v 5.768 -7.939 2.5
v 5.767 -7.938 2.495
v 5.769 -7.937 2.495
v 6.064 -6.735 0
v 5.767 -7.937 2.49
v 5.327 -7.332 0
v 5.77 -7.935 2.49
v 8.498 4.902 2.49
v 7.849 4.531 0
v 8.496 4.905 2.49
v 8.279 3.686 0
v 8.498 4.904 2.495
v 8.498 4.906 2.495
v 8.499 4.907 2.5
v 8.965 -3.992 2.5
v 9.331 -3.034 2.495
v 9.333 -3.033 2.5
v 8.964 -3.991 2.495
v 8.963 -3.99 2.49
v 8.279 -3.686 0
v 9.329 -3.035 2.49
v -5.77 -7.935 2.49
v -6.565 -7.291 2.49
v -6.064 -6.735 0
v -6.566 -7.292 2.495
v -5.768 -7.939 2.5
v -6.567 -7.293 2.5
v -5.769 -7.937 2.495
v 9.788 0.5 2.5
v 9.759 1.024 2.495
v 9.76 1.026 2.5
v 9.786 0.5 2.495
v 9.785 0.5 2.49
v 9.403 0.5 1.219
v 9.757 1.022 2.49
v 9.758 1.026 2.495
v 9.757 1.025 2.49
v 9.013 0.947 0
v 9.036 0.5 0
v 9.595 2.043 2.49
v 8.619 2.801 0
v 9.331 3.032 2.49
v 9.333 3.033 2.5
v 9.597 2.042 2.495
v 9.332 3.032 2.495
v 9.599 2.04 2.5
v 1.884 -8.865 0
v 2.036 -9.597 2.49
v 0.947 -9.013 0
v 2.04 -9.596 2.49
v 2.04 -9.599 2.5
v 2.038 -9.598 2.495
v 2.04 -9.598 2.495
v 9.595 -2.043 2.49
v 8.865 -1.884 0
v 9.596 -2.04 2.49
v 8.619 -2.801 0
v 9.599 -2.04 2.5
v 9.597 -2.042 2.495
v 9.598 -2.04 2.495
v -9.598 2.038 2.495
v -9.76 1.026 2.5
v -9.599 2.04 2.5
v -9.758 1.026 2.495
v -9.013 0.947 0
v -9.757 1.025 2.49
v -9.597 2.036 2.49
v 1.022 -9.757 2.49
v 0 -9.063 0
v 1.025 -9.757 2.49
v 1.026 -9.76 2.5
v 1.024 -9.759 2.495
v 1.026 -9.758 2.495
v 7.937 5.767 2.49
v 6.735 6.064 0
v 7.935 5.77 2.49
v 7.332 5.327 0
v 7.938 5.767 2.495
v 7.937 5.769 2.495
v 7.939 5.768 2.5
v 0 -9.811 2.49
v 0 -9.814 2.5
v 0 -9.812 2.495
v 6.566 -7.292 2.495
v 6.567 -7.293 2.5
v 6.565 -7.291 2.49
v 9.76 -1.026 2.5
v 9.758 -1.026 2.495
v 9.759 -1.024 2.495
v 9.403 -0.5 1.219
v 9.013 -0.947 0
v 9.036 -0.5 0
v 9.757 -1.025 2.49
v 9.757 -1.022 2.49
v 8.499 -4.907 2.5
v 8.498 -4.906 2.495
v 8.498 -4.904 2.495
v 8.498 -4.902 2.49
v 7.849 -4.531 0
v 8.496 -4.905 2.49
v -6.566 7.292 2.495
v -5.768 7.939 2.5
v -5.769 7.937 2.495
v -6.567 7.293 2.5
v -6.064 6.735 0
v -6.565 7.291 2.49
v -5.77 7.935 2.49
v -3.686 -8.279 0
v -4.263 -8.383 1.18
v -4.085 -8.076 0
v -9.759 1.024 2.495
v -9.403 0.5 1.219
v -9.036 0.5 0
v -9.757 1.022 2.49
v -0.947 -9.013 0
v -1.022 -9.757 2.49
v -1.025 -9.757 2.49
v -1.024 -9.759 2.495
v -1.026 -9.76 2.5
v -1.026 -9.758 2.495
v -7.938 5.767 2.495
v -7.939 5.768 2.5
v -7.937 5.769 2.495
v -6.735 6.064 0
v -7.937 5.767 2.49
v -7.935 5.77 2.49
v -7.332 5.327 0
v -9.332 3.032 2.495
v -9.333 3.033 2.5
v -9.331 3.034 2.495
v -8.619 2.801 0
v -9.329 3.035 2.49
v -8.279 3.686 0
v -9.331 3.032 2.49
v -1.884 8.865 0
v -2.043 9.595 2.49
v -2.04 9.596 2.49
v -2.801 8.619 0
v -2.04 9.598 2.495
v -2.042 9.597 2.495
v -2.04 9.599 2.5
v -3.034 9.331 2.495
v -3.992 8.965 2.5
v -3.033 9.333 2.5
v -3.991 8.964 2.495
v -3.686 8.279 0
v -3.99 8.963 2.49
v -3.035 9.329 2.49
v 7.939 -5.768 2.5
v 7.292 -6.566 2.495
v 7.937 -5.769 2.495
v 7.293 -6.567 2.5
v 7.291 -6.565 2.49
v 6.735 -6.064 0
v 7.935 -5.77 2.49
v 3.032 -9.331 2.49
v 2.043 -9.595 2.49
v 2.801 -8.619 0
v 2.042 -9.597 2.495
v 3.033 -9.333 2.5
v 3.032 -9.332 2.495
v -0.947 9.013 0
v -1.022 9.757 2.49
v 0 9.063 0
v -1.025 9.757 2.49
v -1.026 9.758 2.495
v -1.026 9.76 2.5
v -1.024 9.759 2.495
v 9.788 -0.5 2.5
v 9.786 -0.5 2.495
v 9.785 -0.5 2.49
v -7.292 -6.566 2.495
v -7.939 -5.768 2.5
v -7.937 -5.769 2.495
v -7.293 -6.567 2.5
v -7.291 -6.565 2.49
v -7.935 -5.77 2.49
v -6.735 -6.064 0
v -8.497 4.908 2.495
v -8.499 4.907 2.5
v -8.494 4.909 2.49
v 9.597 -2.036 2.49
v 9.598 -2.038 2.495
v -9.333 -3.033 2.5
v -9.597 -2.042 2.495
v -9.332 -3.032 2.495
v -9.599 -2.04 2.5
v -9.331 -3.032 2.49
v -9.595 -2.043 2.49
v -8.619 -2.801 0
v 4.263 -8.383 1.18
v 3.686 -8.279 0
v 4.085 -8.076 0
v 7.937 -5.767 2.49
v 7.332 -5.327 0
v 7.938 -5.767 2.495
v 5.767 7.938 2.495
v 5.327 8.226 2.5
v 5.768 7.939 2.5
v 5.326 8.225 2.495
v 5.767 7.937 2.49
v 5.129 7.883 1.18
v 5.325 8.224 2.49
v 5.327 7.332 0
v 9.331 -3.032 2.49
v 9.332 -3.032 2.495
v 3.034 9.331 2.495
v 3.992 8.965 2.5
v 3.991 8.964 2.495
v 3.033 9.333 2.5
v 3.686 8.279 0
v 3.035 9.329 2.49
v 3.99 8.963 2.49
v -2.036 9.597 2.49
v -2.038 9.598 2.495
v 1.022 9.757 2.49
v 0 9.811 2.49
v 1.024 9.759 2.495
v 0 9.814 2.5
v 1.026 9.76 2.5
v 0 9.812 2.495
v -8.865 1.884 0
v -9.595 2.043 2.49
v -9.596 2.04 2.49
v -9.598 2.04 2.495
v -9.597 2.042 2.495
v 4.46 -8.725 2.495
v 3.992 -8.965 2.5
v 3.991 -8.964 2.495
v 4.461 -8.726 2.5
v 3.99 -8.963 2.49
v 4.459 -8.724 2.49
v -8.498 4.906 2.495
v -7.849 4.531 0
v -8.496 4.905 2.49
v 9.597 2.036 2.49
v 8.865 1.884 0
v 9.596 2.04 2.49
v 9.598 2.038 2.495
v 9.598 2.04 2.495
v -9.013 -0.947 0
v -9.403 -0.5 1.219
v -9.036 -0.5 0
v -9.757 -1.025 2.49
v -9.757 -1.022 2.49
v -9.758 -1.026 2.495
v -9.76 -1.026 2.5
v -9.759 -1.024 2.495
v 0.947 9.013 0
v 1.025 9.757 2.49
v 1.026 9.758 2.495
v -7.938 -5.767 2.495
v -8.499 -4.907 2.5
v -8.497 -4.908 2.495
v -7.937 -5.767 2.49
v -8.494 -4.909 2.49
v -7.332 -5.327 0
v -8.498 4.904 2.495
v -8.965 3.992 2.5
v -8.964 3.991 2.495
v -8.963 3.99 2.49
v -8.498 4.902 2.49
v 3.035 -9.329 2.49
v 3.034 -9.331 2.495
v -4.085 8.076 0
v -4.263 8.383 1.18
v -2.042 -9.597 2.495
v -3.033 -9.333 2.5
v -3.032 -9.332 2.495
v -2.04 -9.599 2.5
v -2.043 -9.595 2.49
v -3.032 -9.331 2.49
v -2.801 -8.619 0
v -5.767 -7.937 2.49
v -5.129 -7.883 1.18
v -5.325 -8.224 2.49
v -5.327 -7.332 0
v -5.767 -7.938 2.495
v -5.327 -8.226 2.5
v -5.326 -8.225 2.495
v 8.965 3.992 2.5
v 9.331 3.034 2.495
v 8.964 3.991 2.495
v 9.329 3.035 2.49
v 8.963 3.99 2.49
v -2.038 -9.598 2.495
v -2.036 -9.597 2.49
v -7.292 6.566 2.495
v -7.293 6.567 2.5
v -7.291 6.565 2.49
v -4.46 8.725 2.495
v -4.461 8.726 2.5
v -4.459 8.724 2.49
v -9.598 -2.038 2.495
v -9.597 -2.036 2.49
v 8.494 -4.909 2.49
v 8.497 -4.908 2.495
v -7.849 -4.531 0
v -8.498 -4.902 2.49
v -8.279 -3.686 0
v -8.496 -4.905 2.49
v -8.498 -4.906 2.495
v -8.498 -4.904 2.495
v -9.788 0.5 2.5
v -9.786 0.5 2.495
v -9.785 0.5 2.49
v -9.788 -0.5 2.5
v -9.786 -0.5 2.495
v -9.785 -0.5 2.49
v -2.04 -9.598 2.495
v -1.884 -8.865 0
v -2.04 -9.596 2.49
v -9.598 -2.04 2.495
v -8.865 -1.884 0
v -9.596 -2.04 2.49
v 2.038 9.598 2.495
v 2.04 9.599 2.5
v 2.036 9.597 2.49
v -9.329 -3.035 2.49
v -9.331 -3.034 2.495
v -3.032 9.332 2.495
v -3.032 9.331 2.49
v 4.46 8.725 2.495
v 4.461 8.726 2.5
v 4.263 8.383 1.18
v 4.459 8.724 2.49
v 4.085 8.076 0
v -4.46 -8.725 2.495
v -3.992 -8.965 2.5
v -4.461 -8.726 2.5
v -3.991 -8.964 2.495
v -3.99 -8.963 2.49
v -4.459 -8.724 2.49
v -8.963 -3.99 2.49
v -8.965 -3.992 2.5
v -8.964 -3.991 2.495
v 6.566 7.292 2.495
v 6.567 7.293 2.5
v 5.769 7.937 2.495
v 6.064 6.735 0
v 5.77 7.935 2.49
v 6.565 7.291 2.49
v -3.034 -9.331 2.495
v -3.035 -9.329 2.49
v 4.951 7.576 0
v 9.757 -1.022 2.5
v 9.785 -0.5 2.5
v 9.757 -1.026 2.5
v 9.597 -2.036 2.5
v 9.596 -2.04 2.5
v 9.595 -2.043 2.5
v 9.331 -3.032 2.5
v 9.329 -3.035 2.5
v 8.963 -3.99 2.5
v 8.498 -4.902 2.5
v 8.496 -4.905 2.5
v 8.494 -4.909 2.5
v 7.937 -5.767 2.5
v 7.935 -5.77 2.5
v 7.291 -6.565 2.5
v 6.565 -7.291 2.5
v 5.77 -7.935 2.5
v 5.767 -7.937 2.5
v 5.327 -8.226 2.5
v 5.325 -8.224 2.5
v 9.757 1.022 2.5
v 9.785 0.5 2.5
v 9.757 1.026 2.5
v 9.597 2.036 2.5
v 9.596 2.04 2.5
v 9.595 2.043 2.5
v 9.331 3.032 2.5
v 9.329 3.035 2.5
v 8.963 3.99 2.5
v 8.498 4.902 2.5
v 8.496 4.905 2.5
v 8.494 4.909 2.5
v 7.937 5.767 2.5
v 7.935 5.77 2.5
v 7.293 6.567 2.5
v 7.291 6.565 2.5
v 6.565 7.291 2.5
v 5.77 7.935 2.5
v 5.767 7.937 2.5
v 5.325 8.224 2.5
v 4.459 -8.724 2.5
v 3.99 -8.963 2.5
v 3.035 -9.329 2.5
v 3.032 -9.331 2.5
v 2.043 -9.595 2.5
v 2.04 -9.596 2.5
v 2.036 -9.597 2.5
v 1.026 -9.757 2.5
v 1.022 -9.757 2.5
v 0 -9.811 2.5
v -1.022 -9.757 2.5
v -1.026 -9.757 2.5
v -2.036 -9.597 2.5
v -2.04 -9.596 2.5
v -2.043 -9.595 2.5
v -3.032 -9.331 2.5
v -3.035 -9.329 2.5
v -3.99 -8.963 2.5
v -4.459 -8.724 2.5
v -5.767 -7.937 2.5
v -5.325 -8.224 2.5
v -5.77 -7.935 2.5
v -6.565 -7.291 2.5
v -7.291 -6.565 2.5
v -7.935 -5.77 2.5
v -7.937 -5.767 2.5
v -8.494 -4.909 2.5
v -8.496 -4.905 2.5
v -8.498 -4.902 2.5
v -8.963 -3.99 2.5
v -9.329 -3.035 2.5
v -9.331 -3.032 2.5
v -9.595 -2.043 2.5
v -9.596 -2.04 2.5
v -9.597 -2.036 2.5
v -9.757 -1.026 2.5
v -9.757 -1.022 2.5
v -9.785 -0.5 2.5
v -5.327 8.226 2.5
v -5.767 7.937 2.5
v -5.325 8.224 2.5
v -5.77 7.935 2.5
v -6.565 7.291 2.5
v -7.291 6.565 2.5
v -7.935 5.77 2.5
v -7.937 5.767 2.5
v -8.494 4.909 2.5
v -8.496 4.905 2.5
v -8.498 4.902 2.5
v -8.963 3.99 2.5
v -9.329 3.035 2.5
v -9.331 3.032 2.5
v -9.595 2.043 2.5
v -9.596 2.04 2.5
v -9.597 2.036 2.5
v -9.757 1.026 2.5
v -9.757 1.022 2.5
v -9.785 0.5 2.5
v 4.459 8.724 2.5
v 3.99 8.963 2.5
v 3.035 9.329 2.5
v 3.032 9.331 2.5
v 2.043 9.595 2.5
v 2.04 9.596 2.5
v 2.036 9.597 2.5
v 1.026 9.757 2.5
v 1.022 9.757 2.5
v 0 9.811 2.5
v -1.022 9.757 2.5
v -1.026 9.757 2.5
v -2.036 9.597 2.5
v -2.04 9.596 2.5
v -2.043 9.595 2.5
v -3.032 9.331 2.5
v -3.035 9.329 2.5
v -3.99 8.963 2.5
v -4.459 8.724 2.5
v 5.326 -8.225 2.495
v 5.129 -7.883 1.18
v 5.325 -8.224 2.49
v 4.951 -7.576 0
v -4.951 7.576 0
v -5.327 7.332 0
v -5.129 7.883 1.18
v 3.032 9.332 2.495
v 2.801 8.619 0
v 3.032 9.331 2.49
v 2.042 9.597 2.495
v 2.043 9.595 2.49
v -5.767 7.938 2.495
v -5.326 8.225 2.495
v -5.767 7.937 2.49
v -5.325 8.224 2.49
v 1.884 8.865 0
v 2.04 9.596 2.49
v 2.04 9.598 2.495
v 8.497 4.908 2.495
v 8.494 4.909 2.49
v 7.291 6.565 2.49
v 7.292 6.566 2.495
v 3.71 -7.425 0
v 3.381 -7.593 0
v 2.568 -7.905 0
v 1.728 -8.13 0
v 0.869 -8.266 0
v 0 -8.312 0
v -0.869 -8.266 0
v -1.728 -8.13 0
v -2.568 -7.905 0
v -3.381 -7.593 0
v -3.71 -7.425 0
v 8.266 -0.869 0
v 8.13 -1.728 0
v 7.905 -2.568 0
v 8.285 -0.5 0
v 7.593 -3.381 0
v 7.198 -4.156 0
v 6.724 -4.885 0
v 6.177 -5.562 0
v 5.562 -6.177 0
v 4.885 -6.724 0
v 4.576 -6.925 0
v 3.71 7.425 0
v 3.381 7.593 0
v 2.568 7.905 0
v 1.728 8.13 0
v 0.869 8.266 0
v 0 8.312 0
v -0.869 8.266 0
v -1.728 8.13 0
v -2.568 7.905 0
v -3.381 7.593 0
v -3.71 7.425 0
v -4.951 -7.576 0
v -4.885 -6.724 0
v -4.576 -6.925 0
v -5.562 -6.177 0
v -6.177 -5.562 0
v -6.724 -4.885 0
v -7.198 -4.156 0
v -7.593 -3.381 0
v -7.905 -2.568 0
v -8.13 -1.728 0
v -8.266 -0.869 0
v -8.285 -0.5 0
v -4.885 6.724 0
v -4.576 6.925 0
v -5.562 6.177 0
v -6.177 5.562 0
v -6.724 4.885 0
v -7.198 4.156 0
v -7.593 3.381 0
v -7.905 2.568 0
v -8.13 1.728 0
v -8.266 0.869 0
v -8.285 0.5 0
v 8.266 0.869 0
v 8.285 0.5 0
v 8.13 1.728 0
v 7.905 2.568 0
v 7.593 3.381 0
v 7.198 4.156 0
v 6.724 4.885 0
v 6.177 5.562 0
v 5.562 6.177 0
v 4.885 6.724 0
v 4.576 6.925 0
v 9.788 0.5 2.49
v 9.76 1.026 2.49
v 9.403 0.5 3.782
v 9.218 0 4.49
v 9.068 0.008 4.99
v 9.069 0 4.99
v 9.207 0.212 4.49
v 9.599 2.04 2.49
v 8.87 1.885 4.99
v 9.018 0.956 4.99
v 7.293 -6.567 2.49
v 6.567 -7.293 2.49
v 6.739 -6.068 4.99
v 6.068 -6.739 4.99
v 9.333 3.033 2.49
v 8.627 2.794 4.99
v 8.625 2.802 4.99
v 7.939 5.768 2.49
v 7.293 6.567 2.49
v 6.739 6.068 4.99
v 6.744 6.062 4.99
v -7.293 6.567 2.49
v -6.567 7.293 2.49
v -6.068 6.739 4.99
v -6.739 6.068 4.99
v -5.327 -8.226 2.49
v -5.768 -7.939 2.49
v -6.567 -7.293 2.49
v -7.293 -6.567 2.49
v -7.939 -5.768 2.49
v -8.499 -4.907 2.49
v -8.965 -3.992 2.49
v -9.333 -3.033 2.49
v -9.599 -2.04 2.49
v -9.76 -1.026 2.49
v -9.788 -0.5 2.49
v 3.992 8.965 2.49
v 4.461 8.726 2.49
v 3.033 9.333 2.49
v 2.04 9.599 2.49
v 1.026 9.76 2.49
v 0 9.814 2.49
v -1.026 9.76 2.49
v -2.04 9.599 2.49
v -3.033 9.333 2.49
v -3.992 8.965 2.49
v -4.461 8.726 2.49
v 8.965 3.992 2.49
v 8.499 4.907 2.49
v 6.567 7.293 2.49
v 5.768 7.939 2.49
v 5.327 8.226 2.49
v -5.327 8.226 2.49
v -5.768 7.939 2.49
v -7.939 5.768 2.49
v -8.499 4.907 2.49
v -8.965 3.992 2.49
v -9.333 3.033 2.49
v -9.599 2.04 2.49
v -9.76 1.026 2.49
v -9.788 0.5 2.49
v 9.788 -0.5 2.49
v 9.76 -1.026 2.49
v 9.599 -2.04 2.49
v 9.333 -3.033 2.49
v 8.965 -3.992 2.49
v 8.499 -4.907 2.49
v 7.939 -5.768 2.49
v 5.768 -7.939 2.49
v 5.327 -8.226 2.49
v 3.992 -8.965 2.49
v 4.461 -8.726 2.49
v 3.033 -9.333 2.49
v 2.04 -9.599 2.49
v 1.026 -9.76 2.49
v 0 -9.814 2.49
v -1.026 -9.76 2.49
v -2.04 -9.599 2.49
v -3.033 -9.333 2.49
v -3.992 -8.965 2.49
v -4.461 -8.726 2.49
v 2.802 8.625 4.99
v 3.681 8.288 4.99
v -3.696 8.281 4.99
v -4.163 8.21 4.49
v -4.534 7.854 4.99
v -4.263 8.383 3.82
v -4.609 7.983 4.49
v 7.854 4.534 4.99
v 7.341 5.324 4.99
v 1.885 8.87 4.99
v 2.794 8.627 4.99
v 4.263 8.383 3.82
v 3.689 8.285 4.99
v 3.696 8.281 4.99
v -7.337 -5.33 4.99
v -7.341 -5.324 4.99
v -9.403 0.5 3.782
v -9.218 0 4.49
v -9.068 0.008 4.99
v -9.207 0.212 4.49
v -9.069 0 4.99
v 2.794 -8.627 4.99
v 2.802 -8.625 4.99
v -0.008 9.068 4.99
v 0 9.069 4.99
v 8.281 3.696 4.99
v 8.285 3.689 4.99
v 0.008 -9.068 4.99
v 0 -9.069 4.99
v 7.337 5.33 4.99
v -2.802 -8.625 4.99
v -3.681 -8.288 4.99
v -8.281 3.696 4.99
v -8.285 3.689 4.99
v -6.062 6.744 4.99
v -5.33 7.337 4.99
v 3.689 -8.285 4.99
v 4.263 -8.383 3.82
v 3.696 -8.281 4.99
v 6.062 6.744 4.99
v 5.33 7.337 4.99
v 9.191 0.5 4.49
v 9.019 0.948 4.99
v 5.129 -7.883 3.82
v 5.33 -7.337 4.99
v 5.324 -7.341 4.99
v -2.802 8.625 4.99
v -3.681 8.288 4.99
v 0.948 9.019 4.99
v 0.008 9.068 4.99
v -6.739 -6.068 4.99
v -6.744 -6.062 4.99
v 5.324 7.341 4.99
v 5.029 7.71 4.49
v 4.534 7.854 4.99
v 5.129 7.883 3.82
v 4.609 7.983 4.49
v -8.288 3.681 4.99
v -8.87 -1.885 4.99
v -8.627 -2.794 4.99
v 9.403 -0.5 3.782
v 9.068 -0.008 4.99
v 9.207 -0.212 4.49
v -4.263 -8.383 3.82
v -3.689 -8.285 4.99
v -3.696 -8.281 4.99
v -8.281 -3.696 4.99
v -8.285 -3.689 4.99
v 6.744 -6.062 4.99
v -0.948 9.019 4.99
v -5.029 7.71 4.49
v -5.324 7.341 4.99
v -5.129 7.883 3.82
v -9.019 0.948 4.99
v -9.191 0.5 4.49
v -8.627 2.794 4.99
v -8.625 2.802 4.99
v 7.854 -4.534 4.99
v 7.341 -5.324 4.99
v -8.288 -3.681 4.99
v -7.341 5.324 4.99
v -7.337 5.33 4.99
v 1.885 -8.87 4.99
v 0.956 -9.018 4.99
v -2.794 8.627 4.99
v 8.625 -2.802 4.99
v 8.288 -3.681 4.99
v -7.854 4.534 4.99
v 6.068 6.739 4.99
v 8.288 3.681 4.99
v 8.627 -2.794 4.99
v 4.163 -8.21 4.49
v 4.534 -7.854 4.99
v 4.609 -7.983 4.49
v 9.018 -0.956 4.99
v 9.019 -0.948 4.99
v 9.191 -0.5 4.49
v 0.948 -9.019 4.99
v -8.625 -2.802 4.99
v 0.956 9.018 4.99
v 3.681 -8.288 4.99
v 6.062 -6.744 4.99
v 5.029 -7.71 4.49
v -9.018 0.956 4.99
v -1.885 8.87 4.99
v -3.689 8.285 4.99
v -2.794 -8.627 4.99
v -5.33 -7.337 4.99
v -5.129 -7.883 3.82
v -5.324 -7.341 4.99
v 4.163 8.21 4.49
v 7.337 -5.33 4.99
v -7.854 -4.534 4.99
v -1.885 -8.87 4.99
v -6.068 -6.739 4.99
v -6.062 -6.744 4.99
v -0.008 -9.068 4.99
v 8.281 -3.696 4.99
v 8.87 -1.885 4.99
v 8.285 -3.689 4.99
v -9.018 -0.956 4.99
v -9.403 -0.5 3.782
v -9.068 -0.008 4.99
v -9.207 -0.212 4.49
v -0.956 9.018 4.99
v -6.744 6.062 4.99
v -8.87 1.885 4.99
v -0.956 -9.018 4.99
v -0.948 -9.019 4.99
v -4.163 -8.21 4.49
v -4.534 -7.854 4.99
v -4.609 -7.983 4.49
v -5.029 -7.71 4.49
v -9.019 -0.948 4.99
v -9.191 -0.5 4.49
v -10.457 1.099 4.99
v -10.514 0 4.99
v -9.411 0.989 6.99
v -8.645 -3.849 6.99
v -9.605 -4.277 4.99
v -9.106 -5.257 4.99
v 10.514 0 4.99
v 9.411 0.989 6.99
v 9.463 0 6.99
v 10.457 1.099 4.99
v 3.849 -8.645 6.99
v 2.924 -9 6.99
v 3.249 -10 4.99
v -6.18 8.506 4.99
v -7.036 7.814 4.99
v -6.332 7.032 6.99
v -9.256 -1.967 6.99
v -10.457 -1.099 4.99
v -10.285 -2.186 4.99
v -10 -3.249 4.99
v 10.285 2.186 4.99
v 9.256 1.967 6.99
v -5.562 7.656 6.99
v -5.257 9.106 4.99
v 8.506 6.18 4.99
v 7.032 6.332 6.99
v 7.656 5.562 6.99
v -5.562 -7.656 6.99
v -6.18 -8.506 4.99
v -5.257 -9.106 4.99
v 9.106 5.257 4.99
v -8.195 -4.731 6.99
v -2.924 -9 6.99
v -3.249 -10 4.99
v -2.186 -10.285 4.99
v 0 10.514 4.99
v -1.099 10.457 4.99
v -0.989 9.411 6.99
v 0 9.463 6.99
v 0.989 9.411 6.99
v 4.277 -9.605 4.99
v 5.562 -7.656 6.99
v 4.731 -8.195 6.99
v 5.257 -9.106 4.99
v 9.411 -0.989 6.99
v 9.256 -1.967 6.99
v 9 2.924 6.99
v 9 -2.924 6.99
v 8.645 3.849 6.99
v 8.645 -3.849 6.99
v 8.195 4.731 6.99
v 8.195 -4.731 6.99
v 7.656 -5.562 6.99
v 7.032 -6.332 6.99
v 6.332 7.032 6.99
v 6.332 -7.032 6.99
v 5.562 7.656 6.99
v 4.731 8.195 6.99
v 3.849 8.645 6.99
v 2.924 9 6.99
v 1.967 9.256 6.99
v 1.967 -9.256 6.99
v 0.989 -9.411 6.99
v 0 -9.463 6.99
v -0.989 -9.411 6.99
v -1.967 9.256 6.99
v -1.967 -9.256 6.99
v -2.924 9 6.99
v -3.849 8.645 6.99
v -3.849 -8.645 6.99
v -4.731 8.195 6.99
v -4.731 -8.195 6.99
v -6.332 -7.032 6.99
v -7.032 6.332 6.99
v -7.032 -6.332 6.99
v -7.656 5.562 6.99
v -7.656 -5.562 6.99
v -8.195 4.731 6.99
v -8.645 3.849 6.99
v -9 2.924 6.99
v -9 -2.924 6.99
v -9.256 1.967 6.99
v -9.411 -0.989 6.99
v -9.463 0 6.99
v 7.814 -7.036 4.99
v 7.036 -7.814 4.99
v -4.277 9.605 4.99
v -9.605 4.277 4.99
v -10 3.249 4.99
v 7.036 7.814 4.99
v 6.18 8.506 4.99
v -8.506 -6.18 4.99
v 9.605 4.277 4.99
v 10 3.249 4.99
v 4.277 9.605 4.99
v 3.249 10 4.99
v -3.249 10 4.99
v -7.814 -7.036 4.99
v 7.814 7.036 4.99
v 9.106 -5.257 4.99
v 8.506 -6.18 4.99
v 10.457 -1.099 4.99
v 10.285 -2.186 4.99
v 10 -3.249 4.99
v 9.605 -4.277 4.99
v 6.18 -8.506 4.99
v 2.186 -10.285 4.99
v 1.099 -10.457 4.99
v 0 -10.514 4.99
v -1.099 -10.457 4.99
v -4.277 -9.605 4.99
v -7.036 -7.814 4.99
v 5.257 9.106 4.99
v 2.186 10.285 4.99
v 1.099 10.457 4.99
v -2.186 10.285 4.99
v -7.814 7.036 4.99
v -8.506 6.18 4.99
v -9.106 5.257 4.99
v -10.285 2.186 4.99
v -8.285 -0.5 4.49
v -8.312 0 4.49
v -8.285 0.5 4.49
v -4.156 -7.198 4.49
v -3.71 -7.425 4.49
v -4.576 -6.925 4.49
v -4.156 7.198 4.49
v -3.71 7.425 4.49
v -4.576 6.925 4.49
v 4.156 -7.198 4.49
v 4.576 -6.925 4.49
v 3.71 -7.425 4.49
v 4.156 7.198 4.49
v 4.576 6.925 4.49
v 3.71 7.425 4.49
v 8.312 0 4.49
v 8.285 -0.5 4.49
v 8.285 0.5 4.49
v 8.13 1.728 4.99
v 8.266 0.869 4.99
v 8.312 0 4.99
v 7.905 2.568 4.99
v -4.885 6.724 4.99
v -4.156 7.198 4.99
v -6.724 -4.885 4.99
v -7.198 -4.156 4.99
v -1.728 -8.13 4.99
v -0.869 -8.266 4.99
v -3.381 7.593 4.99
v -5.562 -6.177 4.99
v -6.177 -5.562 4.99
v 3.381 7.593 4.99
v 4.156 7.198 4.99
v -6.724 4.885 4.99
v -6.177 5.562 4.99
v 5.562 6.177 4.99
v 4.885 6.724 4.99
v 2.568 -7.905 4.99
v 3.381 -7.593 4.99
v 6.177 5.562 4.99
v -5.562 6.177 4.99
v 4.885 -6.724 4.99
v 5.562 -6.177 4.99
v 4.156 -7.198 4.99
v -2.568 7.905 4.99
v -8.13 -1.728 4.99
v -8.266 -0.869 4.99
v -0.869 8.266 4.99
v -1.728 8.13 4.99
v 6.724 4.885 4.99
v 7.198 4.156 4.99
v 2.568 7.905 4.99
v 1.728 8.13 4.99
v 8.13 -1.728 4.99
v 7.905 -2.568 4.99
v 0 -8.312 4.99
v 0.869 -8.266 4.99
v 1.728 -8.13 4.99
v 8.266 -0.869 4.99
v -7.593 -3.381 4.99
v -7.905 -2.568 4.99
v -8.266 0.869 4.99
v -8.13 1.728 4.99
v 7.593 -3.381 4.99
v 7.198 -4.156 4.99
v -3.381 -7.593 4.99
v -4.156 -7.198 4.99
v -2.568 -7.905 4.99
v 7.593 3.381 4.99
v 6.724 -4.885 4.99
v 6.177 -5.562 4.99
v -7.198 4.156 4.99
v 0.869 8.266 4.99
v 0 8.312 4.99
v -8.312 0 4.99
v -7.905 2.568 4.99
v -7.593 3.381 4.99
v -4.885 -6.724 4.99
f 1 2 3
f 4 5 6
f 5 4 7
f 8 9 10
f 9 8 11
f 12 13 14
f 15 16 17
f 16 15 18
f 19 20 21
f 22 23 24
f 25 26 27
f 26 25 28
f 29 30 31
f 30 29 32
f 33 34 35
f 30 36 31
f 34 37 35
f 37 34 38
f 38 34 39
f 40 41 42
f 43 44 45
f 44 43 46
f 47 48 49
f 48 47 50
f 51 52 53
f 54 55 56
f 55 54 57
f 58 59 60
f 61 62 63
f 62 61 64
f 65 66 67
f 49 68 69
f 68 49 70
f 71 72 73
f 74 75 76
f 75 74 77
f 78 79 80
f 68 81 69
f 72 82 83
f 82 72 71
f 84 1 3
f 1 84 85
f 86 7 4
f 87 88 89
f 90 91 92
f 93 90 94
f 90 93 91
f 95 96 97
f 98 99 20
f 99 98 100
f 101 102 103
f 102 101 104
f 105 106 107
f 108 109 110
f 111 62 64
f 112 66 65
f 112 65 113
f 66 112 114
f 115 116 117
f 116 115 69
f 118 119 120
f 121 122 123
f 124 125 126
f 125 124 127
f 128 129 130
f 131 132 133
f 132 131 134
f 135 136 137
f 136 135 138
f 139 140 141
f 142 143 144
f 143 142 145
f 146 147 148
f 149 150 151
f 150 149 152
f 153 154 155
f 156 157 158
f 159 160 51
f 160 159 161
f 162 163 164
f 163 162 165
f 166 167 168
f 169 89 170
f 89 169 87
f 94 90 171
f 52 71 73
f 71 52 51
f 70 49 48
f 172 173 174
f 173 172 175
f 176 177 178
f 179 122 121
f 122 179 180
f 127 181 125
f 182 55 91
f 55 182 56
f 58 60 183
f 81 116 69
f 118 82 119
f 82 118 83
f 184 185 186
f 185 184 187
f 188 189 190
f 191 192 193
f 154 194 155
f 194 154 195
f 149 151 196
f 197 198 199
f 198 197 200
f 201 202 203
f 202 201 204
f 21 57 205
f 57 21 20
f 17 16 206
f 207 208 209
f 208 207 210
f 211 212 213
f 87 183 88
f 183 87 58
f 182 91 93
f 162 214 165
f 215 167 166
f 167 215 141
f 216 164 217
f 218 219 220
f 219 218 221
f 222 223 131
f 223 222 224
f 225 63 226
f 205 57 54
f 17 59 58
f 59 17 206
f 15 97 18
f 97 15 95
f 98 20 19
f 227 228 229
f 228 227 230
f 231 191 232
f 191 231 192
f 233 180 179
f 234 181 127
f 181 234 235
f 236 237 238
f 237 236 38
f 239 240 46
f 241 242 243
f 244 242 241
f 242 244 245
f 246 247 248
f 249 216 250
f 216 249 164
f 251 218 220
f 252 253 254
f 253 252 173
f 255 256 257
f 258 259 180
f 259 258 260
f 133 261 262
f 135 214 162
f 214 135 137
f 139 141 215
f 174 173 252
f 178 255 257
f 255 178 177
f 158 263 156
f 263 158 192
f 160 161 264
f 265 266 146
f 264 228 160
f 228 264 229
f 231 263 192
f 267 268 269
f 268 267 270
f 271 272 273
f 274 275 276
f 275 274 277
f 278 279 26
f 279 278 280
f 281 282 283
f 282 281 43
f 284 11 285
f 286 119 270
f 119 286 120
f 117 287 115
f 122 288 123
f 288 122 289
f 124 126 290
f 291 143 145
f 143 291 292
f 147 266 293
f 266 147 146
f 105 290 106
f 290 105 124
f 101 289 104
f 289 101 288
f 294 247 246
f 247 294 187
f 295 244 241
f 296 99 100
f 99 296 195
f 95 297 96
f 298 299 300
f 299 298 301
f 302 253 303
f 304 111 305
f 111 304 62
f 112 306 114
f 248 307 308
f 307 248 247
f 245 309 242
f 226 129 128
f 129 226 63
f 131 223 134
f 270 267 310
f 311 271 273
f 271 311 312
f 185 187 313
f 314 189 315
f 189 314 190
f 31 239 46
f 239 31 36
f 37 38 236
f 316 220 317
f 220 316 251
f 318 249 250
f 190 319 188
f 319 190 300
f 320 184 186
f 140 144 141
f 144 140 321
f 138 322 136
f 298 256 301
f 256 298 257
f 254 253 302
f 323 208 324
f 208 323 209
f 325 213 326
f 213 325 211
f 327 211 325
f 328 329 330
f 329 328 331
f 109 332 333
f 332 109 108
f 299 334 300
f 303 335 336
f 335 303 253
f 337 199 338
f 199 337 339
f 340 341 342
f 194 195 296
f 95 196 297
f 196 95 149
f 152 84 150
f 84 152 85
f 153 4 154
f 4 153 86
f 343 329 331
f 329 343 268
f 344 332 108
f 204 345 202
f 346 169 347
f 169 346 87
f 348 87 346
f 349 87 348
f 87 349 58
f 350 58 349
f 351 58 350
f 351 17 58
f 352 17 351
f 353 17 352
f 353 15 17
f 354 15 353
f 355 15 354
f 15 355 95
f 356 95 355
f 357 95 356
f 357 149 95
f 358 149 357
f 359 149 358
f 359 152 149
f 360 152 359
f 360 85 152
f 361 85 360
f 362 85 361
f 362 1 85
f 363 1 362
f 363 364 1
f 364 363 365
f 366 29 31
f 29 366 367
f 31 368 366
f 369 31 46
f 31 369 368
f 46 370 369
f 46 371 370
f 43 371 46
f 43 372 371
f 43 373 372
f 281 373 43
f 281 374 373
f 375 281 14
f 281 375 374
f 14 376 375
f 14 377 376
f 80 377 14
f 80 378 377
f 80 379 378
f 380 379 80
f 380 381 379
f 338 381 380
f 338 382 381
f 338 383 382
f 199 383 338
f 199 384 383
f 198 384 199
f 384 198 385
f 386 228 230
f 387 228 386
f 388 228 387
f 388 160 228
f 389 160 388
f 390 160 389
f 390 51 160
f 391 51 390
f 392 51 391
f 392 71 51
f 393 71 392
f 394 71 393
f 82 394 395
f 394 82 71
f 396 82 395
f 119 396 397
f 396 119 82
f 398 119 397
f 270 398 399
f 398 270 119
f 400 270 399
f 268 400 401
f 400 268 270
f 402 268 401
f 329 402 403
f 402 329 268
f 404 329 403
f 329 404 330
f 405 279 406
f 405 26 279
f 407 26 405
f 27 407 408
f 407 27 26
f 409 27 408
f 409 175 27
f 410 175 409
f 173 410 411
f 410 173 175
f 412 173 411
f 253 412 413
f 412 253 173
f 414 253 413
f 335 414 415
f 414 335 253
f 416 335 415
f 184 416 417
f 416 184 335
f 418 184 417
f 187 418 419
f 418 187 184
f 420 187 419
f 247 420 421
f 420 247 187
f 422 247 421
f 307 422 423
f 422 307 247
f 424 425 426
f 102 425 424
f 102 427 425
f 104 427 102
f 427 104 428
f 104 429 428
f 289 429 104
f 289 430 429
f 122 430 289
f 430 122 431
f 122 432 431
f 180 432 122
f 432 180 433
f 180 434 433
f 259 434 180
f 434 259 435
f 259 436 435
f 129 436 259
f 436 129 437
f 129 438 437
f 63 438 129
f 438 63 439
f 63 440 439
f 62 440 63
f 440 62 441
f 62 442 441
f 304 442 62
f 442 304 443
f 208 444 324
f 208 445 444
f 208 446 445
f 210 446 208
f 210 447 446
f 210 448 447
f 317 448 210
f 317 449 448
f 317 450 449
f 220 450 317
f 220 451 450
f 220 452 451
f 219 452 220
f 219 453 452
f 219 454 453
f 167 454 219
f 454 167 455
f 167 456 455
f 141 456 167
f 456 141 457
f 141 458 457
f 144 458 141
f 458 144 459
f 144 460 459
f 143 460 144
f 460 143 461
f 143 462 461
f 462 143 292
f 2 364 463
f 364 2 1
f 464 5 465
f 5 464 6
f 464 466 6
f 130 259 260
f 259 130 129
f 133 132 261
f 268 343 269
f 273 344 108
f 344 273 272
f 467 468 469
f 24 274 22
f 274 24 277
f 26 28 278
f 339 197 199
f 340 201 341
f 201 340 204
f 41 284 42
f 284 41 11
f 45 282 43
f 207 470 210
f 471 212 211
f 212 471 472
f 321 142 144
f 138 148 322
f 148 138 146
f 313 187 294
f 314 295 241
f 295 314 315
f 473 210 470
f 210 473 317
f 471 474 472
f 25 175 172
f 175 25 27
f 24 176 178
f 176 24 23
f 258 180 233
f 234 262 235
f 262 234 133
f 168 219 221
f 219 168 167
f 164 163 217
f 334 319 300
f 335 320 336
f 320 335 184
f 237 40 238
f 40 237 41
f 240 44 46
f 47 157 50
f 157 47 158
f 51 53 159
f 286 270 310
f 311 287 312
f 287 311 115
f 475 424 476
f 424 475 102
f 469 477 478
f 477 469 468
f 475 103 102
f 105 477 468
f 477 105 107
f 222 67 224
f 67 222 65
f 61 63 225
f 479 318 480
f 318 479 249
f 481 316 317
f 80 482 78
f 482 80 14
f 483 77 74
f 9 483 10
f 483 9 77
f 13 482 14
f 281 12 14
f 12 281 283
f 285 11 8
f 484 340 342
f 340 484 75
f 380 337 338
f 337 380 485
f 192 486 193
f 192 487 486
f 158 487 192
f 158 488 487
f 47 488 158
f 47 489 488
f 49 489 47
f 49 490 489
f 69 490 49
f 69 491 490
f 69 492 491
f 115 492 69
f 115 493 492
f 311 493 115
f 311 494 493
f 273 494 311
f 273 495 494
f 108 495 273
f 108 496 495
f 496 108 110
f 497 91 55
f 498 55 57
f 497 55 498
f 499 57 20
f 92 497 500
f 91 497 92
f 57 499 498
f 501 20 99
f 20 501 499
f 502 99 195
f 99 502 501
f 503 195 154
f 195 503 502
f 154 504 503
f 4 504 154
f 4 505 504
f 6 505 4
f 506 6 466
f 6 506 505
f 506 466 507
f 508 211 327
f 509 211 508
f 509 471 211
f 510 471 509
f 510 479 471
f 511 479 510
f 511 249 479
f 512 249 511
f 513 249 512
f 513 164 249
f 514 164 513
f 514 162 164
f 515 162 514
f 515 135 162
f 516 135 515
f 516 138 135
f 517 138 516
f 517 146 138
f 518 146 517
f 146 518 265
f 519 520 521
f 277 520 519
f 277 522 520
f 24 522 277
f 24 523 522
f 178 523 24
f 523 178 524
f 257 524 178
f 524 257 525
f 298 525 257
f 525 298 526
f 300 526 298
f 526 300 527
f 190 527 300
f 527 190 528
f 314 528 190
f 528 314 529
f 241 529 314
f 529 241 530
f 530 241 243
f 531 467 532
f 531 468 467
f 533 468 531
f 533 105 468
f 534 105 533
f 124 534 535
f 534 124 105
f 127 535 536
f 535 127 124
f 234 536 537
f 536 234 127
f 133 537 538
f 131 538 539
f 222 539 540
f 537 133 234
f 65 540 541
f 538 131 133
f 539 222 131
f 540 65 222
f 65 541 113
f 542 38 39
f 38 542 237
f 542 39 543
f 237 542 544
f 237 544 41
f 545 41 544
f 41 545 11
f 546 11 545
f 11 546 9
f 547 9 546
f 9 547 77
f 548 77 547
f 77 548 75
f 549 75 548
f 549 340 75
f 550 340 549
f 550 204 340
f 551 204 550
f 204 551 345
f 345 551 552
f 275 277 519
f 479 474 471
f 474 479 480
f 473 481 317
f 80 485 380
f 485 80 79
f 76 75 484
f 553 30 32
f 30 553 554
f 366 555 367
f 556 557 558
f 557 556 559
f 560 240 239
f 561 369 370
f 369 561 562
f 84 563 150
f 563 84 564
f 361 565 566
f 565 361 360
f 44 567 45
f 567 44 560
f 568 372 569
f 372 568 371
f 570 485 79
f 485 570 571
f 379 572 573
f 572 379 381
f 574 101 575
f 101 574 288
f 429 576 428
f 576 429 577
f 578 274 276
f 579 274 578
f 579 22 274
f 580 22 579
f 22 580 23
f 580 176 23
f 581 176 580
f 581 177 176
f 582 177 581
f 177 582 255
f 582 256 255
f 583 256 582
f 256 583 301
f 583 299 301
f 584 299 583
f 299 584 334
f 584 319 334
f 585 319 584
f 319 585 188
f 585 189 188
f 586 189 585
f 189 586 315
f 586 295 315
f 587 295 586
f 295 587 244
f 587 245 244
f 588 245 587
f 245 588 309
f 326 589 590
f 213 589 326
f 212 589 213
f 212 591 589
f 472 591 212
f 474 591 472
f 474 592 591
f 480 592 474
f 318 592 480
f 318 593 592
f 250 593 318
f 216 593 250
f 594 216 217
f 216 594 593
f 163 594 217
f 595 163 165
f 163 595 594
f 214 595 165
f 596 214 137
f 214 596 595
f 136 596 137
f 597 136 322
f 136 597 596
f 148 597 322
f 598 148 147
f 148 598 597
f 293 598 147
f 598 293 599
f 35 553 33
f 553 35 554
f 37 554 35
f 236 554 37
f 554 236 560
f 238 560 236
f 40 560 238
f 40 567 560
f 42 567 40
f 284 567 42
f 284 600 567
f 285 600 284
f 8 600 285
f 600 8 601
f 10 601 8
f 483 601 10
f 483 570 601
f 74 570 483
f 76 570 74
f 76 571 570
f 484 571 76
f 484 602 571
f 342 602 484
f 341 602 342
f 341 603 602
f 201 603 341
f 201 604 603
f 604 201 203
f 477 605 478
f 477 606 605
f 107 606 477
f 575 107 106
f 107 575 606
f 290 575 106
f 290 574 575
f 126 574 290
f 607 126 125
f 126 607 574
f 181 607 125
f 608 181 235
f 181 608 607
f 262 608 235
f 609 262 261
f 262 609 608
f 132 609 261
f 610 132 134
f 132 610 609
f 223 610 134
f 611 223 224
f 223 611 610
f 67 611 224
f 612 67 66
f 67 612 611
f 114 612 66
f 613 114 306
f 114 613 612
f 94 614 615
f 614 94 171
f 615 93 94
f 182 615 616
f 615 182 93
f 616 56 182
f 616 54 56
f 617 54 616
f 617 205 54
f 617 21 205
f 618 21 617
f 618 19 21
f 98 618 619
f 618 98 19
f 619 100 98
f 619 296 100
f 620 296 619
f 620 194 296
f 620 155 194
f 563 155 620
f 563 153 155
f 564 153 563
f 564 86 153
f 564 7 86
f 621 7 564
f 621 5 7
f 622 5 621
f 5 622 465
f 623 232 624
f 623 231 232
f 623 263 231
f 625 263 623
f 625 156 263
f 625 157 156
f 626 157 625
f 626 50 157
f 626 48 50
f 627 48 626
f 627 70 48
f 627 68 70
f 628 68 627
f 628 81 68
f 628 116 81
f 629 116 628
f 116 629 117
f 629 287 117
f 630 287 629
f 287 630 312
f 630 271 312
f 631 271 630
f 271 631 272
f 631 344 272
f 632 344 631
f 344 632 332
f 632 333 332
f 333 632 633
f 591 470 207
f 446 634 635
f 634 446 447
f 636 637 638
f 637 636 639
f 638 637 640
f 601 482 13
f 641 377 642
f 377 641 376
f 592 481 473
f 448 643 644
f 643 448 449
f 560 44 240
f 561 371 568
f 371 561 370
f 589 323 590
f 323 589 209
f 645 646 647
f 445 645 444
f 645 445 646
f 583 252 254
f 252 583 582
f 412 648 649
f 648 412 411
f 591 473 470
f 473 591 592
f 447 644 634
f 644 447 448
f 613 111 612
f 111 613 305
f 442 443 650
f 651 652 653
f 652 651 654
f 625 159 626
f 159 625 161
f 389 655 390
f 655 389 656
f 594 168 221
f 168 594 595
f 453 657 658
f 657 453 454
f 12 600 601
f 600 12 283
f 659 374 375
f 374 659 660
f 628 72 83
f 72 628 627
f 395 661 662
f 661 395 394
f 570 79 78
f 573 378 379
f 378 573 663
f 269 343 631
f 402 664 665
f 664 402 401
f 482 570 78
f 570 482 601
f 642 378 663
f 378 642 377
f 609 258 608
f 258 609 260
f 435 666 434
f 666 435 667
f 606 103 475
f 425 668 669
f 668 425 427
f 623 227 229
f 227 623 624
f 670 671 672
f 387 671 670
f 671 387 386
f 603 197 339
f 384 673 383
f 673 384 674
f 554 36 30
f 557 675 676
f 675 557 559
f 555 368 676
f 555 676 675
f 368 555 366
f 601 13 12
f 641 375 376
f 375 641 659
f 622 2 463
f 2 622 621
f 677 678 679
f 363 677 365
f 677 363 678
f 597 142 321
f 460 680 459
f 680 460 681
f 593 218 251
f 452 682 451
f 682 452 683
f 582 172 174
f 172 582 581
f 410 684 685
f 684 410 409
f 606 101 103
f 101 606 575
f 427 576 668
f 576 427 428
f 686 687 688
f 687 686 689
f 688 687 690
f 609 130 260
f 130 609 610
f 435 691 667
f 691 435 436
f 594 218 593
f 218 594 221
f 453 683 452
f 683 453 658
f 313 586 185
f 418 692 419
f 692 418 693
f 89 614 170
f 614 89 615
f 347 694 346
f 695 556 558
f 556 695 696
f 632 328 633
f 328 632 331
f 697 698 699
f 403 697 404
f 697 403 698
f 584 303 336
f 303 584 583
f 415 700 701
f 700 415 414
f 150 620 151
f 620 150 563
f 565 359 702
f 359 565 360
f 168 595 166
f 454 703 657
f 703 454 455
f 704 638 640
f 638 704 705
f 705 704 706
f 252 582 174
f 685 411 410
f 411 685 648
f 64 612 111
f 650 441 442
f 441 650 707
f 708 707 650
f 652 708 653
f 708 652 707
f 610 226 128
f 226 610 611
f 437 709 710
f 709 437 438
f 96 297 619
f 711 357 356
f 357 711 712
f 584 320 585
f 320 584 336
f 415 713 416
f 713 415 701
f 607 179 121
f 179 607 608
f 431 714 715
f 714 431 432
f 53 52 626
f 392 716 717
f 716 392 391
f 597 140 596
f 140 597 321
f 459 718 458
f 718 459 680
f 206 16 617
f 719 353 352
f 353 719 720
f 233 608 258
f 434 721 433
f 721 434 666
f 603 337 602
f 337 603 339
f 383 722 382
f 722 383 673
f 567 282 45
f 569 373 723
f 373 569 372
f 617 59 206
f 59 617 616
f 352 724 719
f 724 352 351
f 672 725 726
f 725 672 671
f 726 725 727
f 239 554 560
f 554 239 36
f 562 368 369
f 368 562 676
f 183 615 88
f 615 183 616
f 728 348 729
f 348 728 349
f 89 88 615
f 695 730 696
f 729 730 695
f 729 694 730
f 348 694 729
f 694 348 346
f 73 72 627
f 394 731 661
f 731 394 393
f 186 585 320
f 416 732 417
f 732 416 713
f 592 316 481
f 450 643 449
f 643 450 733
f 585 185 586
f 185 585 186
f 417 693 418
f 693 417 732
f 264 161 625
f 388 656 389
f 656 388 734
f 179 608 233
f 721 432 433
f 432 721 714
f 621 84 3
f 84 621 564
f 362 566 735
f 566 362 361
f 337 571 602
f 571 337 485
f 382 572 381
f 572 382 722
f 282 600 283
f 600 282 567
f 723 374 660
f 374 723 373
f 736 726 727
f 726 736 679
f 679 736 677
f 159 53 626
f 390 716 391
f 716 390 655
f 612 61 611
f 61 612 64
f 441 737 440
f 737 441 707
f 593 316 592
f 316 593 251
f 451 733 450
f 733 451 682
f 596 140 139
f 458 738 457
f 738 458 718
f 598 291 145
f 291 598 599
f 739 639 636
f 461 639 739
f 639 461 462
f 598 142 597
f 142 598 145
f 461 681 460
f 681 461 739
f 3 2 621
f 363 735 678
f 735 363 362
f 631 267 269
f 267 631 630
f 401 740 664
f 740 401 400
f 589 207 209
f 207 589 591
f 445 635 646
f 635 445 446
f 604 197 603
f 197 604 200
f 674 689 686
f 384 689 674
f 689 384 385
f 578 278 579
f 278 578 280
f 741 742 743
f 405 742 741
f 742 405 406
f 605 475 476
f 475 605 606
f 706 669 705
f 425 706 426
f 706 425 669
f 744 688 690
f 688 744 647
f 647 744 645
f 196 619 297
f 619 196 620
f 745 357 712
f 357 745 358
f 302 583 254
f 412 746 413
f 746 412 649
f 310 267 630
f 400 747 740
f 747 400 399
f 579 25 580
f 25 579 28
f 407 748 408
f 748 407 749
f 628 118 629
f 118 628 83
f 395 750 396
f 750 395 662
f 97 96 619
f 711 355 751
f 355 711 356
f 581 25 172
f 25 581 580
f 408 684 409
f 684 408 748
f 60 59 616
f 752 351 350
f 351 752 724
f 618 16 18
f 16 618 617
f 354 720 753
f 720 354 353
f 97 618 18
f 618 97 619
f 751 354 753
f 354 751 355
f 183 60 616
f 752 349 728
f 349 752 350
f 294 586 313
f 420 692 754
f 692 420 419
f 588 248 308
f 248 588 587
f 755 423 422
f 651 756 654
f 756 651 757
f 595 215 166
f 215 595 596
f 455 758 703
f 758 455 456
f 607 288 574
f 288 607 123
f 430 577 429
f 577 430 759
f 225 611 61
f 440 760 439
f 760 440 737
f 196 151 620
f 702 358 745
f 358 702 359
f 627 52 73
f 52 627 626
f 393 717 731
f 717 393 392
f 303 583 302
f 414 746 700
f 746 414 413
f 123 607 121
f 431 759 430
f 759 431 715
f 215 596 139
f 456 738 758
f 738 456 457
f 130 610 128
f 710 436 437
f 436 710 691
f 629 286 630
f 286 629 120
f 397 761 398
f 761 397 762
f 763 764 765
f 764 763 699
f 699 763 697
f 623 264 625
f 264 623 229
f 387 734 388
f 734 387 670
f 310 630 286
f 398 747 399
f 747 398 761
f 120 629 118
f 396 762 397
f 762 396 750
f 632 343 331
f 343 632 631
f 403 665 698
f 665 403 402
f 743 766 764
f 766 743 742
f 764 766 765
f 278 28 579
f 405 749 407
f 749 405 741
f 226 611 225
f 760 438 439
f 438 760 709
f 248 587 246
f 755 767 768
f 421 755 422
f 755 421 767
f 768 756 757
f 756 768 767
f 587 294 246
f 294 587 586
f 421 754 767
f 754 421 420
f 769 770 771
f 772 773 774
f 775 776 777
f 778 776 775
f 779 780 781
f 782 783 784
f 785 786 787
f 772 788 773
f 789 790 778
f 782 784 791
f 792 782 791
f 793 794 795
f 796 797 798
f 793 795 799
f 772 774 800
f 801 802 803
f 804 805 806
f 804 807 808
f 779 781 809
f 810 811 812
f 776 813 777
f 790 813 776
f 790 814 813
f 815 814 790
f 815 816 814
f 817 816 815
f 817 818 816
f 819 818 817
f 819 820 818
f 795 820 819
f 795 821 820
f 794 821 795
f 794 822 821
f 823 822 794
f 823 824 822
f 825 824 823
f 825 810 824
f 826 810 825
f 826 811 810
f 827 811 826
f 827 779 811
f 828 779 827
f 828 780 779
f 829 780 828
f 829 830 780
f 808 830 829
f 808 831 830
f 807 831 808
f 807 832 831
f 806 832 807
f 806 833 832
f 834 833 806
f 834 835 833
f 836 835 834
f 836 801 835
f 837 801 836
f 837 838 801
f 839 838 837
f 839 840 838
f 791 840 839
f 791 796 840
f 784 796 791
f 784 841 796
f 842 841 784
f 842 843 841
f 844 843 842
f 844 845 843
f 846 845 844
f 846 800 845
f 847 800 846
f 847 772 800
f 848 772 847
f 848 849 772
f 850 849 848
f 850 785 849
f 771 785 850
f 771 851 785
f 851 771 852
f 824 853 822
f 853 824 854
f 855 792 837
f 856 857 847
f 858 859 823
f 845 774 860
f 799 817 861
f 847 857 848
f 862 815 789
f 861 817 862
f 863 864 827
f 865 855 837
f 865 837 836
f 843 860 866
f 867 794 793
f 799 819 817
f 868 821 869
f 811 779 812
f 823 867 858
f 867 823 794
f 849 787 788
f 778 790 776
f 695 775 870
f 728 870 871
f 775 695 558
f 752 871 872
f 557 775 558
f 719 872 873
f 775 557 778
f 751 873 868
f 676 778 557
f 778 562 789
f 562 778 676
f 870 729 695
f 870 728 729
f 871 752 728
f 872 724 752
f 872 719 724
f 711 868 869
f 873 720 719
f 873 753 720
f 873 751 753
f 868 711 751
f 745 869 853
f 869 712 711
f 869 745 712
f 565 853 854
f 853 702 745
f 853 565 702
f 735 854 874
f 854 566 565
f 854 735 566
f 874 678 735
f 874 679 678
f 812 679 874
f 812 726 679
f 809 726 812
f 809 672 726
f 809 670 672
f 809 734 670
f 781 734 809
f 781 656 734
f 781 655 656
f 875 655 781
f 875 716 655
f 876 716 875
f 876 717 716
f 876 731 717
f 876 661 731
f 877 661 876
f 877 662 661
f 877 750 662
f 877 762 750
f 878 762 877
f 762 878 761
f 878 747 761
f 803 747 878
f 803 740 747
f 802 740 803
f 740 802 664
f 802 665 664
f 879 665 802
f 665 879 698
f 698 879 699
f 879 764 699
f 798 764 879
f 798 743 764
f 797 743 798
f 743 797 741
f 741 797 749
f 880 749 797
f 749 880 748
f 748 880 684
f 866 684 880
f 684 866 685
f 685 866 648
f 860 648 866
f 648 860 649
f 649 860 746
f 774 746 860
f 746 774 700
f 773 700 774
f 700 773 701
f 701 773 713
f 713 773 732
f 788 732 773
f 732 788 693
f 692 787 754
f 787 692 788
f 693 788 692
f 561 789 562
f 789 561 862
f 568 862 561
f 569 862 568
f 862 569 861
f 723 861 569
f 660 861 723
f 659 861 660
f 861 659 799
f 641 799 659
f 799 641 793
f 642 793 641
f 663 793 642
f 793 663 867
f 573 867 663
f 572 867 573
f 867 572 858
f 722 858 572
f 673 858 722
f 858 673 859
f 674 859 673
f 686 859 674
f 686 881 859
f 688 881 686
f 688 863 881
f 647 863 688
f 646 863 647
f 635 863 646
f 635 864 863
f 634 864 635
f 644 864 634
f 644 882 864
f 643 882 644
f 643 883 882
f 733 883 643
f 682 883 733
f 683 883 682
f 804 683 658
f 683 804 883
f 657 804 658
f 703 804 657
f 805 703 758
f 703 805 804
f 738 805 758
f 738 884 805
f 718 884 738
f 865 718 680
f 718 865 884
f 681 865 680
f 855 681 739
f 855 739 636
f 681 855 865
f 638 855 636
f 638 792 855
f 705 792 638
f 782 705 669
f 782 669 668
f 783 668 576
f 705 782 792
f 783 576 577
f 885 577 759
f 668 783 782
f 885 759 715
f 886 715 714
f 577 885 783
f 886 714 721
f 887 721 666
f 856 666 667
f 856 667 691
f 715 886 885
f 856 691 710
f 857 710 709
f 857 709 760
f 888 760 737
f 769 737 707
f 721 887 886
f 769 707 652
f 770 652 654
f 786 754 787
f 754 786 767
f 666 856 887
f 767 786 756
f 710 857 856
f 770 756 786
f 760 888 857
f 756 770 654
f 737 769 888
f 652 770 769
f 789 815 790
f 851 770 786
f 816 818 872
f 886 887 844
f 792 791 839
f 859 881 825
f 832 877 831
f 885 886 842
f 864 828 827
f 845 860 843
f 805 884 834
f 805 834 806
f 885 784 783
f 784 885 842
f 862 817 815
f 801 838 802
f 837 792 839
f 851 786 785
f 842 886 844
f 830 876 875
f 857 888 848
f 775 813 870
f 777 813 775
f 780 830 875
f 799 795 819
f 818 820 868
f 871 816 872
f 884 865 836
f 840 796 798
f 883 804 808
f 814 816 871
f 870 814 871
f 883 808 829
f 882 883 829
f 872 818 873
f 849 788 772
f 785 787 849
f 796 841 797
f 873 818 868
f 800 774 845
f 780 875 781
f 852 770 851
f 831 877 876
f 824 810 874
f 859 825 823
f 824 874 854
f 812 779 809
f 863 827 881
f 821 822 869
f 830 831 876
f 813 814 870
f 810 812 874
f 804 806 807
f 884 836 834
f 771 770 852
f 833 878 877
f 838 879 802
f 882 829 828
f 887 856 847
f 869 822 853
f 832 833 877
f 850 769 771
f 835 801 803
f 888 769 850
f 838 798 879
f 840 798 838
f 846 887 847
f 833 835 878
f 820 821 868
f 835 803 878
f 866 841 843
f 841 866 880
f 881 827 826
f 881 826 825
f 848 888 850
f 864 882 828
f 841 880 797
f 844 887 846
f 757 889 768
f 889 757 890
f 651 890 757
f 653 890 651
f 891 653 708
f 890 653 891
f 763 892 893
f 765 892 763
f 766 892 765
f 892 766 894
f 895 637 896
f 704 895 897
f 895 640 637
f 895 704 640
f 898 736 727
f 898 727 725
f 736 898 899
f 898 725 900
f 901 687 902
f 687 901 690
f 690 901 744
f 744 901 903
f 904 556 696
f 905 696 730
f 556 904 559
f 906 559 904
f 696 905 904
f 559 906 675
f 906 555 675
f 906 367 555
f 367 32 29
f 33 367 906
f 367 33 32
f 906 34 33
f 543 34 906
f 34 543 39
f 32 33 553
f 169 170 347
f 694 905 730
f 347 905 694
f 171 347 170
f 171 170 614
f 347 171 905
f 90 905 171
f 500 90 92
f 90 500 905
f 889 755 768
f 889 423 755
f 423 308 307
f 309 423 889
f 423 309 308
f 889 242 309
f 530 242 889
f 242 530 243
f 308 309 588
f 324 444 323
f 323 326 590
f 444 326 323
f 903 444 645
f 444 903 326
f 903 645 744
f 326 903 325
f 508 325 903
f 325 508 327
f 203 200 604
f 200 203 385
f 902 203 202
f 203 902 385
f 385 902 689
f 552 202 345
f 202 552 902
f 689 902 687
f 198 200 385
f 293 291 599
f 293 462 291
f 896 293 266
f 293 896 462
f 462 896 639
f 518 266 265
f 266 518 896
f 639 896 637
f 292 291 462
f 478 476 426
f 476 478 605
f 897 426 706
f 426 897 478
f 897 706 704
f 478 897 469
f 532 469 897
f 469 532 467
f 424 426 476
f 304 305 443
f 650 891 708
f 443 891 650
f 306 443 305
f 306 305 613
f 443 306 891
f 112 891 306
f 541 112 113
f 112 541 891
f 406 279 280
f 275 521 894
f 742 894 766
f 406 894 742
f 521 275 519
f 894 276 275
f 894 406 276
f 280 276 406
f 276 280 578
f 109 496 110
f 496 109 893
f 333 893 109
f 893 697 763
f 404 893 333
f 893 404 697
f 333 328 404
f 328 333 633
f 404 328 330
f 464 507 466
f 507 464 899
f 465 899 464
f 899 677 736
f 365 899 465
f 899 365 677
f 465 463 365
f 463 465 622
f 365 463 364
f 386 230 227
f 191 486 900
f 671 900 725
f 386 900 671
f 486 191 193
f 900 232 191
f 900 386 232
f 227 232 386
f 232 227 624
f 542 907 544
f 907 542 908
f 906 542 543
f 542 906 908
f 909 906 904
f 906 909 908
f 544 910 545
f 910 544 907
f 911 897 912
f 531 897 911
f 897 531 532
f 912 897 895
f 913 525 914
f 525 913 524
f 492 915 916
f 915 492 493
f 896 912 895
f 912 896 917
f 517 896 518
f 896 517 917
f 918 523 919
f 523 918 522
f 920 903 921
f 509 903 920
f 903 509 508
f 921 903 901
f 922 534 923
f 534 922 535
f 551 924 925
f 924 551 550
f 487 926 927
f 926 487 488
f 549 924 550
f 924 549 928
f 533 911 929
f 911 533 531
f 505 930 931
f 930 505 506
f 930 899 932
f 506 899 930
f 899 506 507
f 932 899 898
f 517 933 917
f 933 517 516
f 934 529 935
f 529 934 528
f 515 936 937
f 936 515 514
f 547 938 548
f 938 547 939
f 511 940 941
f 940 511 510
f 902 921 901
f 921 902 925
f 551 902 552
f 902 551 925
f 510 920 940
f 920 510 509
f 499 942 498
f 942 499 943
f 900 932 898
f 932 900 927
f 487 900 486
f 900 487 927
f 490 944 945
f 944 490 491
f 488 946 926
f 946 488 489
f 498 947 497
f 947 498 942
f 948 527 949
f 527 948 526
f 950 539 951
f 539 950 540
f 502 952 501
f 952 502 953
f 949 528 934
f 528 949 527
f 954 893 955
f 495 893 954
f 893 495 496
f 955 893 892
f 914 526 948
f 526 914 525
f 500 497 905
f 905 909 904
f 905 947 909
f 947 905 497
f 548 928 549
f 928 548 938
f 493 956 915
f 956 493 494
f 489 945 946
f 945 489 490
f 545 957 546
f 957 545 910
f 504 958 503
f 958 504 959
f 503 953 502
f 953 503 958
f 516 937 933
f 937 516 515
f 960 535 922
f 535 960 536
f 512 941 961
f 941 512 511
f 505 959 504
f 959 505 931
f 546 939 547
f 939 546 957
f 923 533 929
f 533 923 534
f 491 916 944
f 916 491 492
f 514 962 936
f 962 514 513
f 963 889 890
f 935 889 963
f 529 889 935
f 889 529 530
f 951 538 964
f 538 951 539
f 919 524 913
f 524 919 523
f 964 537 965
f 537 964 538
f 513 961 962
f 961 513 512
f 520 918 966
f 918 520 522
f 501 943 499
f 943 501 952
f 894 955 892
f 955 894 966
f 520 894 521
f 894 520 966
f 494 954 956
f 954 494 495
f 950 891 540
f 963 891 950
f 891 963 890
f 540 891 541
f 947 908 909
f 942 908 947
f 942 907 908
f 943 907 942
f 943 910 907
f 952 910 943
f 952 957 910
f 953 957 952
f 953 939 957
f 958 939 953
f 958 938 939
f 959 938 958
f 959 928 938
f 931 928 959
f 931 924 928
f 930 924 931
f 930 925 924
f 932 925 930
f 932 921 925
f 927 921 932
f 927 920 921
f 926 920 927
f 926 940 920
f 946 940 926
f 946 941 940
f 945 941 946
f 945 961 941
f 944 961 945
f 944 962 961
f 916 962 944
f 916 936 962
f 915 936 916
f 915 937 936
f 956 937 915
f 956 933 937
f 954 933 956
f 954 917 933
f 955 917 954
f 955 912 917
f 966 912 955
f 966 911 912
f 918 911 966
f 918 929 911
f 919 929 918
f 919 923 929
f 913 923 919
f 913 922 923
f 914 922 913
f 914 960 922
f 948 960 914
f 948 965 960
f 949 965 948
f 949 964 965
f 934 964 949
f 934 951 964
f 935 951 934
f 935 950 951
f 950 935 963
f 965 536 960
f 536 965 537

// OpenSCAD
/* [Facets] */

$fn = 60;        // [3:60] 



/* [Extrusion] */

$EC = 0.4;       // [0:.01:1]



/* [Body] */

// Internal Height
IH      = 5;    // [5:.01:30]

// Split Point
Split_P = .5;    // [.2:.01:.7]

// Internal Pipe Diameter (face to face)
Int_PD  = 20;    // [4:.01:50] 

//Internal Taper Offset
TOff    = 1.5;     // [ .5:.01:4]

//cosine factor
CF= 1/cos(180/$fn);

/* [Cap] */

Cap_D = Int_PD+1;      // [2:.01:75]
Cap_H = 2;       // [2:.01:75]
Cap_Taper = .1;   // [0:.01:1]



/* [Slices] */
// Number of slices
Num_Slice = 6;        // [3:15]

// Wall Thickness
Wal_Thk = 1.5;     // [1:.01:10] 

// Gap between slices
Gap = 1 ;        // [.5:.01:2]

// Distance from Cap to Slice
Z_Off  = .1;     // [0:.01:1]

// Slice Phase
Phase = 0;       // [0:60]





difference() {
   Body();
   slots();
    
   // Hollow
   translate([0,0,-.01])
   cylinder(d=(Int_PD-2*Wal_Thk)*CF-$EC, h=IH);
}


module Body() {
   // Bottom Taper
   cylinder(d1=(Int_PD-TOff)*CF-$EC, d2=Int_PD*CF-$EC, h=IH*Split_P);

   // Top Taper
   translate([0,0,IH*Split_P-.01])
   cylinder(d1=Int_PD*CF-$EC, d2=(Int_PD-TOff)*CF-$EC, h=IH*(1-Split_P)+.02); 
   
   // Cap
   translate([0, 0, IH-.01])
   cylinder(d1=Cap_D*CF, d2=Cap_D*(1-Cap_Taper)*CF,h= Cap_H);
}


module slots() {
   h= IH *(1 - Z_Off);
   
   rotate([0,0,Phase])
   for(i = [0:Num_Slice]) {
      rotate([0,0,i*360/Num_Slice])
      translate([Int_PD/2,0,h/2-.01])
      cube([Int_PD+1,Gap,h],center=true);
   }
}
